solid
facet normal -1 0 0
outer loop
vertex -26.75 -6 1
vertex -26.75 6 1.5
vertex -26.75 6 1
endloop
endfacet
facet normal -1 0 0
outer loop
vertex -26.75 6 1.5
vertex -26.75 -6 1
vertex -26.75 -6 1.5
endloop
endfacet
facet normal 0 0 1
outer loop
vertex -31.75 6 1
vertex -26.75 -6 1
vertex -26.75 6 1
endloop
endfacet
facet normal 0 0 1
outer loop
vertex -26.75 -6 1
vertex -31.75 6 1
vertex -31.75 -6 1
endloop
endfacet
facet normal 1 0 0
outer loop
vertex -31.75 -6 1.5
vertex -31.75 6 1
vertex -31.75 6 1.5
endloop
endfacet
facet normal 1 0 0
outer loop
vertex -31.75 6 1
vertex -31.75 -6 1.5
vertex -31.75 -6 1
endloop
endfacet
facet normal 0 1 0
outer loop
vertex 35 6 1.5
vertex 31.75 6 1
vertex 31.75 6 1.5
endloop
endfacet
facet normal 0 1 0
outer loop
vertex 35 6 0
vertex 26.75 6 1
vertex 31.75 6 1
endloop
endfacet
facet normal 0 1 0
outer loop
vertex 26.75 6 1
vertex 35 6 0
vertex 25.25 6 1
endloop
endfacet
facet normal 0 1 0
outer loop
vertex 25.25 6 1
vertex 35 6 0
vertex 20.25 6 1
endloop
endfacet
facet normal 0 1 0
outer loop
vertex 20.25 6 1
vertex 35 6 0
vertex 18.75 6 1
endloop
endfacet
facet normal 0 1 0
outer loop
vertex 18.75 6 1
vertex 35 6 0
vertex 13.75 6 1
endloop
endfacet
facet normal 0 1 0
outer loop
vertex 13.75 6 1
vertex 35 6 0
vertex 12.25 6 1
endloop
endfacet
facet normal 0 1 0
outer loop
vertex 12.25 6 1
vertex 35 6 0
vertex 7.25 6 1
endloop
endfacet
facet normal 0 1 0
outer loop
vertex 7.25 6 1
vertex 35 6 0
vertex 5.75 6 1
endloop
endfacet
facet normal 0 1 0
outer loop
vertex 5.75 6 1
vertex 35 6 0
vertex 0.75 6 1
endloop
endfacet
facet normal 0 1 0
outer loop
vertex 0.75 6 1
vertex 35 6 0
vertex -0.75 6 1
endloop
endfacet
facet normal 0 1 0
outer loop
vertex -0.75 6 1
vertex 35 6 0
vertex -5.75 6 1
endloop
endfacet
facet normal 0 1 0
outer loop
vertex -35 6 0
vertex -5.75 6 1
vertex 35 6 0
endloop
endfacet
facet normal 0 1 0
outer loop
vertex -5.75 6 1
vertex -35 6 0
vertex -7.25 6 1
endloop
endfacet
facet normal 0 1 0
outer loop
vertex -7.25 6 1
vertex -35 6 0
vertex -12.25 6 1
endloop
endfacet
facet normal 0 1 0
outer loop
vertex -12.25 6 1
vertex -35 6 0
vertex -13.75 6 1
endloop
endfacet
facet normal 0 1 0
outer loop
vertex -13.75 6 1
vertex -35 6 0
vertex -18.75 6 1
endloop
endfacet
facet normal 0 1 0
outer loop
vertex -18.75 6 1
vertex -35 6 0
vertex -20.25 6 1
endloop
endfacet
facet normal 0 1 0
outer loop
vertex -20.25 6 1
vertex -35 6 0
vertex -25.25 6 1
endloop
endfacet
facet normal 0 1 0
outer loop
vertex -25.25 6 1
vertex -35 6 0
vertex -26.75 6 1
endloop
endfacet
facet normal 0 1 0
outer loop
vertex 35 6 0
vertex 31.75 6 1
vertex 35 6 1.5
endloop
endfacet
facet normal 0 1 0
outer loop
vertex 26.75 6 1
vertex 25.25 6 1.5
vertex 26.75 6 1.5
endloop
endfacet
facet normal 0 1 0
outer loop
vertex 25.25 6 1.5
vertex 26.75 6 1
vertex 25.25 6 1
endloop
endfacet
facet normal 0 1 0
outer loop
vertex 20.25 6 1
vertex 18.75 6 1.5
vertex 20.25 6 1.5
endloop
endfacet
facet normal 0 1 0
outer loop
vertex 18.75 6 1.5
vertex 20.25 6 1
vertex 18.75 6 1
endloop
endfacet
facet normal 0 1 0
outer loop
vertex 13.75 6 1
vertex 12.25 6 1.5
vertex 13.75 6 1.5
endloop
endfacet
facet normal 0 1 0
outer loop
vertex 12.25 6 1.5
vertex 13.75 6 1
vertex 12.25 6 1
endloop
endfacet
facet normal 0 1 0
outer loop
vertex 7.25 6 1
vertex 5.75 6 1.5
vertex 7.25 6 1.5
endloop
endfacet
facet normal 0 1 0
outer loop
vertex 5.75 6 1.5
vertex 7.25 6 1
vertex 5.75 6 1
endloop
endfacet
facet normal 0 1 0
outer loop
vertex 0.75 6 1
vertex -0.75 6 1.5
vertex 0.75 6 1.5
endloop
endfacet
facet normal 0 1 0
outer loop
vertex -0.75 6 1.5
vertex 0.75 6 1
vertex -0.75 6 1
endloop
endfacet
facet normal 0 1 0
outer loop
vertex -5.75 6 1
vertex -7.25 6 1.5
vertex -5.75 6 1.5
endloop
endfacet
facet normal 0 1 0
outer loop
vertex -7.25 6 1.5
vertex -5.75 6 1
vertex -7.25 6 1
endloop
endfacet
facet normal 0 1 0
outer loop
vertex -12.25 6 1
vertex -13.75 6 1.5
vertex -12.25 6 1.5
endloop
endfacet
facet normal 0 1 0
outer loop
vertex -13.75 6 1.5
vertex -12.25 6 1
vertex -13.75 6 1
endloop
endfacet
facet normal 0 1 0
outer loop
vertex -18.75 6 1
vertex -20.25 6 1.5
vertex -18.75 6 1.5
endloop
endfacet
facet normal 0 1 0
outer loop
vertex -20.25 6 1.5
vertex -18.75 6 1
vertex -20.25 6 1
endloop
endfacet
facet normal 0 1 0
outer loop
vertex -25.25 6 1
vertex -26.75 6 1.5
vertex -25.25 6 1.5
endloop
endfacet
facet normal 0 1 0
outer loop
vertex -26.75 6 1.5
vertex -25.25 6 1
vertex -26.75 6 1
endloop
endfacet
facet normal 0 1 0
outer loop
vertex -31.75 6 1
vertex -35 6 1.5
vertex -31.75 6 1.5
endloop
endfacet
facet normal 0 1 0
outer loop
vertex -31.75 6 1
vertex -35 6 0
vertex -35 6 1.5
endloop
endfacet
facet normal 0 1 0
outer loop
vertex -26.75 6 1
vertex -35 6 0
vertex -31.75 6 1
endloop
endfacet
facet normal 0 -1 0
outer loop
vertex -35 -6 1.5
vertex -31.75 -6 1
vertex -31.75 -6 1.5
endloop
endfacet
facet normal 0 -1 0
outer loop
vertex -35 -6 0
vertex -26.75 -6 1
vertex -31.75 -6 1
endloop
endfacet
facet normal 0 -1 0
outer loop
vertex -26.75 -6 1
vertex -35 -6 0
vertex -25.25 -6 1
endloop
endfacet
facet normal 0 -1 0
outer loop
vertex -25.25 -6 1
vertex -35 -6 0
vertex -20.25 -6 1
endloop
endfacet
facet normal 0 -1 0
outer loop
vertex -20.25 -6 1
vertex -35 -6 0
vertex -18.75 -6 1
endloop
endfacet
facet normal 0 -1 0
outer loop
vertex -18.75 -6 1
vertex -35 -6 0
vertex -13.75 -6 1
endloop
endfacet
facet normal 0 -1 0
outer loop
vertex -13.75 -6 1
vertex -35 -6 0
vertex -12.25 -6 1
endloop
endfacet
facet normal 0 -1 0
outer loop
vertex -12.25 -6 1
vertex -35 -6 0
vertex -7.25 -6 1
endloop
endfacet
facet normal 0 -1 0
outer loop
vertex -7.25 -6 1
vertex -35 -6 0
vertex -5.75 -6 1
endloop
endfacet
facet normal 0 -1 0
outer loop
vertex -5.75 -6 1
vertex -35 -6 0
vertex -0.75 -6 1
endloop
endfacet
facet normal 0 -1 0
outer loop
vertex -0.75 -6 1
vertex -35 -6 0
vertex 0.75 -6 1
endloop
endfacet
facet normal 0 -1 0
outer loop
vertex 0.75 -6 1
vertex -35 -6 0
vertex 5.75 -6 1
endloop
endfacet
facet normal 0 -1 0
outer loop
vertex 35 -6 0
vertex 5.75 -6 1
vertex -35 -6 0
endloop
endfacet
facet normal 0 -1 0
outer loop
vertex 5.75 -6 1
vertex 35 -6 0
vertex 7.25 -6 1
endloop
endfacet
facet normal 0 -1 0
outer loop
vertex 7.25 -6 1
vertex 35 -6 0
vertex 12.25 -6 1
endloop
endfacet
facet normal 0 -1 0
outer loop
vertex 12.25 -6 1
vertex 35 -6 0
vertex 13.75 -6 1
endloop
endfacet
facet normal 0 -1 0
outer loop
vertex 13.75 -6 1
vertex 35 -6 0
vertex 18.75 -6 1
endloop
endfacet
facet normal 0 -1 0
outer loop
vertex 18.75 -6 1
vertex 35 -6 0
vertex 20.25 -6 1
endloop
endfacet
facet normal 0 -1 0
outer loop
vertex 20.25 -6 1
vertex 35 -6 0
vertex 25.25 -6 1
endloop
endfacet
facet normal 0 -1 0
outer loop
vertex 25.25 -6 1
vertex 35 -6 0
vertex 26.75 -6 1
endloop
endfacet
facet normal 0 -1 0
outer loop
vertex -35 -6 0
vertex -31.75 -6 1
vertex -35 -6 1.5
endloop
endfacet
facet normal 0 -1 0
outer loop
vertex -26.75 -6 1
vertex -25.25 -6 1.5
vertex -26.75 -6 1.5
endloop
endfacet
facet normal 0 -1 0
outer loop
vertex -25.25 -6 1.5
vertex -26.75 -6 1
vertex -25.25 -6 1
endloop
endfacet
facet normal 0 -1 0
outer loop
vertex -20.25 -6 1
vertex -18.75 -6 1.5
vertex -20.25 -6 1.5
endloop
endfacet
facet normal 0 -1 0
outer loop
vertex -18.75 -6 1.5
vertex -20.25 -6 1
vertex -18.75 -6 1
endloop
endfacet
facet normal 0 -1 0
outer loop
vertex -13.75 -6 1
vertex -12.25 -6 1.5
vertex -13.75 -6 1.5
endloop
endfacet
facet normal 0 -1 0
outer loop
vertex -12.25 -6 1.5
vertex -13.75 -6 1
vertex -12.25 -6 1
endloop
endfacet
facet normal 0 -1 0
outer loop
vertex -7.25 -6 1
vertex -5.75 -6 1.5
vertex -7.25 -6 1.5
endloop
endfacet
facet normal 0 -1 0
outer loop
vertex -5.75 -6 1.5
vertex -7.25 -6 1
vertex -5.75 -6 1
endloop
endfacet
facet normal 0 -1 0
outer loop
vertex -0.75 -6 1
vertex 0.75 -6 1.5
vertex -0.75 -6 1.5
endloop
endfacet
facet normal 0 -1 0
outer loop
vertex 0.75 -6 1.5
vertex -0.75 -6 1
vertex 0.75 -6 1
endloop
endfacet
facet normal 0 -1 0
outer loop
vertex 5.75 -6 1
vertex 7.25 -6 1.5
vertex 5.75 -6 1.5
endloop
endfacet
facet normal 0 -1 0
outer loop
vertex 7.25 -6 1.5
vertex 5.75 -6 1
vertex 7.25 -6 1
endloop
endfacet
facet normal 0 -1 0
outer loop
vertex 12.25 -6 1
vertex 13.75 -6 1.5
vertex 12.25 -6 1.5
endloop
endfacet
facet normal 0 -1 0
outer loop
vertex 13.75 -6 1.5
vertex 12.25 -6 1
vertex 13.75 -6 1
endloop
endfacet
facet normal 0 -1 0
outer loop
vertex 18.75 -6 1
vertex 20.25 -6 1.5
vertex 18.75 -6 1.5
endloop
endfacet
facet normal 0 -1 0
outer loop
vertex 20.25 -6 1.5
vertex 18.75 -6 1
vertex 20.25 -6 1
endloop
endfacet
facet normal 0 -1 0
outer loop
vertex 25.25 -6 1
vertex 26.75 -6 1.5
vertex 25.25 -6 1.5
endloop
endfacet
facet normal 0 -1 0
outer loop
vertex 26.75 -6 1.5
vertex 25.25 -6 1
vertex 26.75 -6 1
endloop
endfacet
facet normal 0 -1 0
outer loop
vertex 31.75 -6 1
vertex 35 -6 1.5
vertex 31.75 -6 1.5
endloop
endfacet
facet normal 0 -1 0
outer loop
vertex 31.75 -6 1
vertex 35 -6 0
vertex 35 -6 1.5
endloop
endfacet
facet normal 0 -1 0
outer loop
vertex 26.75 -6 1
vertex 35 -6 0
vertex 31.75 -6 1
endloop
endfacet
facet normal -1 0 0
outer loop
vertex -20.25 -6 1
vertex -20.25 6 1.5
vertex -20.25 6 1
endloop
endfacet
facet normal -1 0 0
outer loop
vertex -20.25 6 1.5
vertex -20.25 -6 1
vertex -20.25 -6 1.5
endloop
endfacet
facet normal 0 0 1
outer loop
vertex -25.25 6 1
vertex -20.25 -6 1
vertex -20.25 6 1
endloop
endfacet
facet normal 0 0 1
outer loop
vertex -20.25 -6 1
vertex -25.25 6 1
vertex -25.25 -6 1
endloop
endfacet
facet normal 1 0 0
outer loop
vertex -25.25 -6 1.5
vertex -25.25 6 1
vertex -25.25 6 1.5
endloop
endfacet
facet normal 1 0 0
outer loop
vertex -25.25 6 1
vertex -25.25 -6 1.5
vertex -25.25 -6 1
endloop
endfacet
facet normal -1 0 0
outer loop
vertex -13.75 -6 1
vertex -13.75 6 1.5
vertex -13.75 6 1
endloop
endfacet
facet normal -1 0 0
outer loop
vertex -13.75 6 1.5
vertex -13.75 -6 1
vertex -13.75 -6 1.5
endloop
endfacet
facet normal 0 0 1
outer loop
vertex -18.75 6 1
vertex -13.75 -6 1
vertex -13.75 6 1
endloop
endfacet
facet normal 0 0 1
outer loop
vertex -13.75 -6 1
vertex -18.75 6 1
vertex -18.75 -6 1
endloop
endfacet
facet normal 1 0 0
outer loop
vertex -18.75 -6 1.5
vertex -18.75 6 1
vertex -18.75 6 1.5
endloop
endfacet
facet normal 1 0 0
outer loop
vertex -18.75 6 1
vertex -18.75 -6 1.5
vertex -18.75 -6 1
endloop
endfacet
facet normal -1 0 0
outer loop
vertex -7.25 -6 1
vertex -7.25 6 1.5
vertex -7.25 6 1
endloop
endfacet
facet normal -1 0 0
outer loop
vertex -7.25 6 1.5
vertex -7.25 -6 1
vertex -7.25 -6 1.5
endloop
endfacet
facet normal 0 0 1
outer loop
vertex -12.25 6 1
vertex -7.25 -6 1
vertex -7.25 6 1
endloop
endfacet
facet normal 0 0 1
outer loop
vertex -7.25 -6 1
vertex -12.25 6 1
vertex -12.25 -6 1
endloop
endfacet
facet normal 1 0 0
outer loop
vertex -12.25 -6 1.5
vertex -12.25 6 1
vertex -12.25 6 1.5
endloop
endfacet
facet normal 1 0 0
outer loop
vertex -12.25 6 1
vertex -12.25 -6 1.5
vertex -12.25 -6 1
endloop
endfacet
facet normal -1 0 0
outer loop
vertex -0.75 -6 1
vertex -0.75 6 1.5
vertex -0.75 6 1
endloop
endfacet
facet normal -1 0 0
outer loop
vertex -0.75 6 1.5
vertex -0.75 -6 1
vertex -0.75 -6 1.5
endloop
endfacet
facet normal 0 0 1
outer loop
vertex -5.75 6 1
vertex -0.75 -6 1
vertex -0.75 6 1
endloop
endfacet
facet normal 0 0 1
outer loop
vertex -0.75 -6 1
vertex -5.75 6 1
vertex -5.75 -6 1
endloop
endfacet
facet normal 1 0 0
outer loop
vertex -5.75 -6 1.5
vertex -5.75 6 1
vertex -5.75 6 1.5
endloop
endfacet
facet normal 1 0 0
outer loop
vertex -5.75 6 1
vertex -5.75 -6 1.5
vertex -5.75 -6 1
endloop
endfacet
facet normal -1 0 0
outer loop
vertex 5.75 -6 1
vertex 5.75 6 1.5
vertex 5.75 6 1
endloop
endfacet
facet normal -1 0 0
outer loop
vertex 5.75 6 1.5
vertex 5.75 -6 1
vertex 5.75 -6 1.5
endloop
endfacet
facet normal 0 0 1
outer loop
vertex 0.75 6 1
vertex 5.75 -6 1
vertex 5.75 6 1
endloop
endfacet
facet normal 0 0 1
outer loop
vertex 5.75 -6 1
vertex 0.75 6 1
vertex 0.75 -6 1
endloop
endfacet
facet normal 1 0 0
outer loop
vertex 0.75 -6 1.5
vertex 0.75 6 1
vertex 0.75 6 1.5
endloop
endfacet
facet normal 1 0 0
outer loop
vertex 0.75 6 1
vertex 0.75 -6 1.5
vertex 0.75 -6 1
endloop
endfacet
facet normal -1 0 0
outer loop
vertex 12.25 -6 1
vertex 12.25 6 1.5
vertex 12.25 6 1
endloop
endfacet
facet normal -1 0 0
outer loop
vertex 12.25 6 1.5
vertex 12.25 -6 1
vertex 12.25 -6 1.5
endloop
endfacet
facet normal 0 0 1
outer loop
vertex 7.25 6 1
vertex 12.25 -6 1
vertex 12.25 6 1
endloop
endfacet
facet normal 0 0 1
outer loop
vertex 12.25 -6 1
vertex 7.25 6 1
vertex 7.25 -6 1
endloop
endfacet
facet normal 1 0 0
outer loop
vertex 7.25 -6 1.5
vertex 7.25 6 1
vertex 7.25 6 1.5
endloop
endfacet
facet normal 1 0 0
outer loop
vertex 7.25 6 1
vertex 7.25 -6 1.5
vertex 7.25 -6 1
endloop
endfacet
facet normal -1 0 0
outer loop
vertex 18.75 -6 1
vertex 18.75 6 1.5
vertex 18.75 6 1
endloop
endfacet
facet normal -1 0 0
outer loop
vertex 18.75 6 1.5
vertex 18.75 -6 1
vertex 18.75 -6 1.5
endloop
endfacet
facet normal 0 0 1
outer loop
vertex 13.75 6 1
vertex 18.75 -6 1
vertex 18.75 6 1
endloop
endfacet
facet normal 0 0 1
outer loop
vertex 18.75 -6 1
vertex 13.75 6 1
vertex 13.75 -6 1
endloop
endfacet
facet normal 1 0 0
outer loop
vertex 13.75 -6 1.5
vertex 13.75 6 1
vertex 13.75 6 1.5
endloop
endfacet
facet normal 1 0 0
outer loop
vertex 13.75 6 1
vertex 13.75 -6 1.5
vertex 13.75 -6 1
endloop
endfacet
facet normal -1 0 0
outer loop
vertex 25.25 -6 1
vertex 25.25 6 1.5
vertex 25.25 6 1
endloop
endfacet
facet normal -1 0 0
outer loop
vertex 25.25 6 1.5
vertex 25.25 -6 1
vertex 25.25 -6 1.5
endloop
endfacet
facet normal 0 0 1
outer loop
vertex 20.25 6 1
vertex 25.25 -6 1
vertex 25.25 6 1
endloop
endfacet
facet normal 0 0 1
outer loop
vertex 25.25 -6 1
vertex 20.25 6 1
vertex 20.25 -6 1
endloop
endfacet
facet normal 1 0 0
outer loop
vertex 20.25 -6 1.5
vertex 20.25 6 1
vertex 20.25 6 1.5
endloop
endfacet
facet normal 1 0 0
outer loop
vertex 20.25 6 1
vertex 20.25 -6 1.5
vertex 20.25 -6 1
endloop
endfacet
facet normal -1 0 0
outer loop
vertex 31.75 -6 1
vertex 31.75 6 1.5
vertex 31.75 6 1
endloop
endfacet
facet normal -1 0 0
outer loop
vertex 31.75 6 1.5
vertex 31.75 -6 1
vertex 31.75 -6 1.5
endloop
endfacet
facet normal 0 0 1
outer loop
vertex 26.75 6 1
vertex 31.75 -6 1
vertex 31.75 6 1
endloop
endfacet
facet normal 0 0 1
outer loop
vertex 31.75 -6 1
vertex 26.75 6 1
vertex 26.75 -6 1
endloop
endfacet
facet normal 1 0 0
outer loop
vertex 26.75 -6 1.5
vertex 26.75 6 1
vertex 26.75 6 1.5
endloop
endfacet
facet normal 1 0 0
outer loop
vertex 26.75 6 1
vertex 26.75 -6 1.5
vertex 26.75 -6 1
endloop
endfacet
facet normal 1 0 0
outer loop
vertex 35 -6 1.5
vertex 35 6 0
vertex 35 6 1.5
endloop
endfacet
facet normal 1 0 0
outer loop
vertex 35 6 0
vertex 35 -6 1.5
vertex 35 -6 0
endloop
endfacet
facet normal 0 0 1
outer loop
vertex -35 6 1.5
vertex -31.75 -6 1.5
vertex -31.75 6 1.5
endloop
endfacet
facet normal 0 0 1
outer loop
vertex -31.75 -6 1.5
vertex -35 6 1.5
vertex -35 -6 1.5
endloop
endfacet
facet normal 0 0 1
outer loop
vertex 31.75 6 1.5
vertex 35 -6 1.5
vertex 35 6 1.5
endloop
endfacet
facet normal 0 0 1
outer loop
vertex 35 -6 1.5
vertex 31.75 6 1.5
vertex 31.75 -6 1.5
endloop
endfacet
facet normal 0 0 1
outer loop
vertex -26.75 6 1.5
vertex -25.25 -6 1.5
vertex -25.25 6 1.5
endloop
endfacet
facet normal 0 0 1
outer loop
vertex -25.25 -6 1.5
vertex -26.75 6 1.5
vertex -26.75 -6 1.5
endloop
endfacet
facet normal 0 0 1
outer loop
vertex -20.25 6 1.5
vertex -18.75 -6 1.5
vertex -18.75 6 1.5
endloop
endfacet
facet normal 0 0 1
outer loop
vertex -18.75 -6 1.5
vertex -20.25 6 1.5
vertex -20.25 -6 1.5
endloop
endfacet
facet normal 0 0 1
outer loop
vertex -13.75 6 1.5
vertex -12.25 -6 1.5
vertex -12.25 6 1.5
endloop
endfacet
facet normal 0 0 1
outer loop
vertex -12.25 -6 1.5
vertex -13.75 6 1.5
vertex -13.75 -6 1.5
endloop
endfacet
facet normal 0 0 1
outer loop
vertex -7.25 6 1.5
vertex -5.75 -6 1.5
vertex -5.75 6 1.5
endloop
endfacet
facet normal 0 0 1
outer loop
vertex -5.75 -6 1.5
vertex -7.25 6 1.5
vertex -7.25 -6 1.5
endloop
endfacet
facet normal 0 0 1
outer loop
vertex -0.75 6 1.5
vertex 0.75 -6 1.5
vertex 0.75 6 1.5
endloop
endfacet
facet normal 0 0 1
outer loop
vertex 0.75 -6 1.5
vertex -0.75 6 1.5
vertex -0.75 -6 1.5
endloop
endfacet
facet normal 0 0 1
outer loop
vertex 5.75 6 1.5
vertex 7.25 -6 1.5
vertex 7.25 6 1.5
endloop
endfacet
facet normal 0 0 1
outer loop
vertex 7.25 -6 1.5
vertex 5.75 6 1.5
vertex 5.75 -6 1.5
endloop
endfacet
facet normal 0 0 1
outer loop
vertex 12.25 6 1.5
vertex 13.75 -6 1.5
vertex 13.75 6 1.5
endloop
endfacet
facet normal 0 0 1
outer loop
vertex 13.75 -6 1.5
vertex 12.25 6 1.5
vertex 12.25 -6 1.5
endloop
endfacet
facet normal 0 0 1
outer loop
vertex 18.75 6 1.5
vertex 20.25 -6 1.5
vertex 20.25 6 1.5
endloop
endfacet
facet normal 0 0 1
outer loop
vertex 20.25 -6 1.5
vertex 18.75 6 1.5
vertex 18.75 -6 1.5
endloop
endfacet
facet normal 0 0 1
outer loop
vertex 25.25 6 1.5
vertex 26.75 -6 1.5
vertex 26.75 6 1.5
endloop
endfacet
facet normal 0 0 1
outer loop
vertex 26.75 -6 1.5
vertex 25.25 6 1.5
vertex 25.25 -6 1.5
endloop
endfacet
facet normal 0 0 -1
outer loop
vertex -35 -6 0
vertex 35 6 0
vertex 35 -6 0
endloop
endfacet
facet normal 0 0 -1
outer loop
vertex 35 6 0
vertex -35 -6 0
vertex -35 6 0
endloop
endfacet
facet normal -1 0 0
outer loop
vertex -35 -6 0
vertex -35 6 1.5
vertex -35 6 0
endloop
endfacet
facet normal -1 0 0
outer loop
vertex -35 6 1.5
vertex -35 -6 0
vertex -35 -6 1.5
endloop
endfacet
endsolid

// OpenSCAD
// 10-well agarose gel comb, printed lying flat
// Units: mm. Print orientation: plate flat on bed, teeth pointing down (-Z).

// ---------------- Parameters ----------------
plate_t      = 1.5;    // plate thickness (Z)
spine_len    = 70;     // spine length (X)
spine_w      = 12;     // spine width (Y)
teeth_count  = 10;     // number of wells
teeth_w      = 5.0;    // tooth width (X)
teeth_l      = 12;     // tooth length (Y)
gap          = 1.5;    // gap between neighbouring teeth (X)
overcut      = 0.5;    // extra length so cutters pass through faces

$fn = 64;

// Derived
pitch   = teeth_w + gap;              // centre-to-centre spacing
x0      = -(teeth_count - 1) * pitch / 2; // first tooth centre (row centred)

// ---------------- Model ----------------
difference() {
    // Spine (back bar)
    translate([-spine_len / 2, -spine_w / 2, 0])
        cube([spine_len, spine_w, plate_t]);

    // Teeth cut out from the top face
    for (i = [0 : teeth_count - 1])
        translate([x0 + i * pitch - teeth_w / 2,
                   -teeth_l / 2,
                   plate_t - overcut])
            cube([teeth_w, teeth_l, plate_t + overcut]);
}
